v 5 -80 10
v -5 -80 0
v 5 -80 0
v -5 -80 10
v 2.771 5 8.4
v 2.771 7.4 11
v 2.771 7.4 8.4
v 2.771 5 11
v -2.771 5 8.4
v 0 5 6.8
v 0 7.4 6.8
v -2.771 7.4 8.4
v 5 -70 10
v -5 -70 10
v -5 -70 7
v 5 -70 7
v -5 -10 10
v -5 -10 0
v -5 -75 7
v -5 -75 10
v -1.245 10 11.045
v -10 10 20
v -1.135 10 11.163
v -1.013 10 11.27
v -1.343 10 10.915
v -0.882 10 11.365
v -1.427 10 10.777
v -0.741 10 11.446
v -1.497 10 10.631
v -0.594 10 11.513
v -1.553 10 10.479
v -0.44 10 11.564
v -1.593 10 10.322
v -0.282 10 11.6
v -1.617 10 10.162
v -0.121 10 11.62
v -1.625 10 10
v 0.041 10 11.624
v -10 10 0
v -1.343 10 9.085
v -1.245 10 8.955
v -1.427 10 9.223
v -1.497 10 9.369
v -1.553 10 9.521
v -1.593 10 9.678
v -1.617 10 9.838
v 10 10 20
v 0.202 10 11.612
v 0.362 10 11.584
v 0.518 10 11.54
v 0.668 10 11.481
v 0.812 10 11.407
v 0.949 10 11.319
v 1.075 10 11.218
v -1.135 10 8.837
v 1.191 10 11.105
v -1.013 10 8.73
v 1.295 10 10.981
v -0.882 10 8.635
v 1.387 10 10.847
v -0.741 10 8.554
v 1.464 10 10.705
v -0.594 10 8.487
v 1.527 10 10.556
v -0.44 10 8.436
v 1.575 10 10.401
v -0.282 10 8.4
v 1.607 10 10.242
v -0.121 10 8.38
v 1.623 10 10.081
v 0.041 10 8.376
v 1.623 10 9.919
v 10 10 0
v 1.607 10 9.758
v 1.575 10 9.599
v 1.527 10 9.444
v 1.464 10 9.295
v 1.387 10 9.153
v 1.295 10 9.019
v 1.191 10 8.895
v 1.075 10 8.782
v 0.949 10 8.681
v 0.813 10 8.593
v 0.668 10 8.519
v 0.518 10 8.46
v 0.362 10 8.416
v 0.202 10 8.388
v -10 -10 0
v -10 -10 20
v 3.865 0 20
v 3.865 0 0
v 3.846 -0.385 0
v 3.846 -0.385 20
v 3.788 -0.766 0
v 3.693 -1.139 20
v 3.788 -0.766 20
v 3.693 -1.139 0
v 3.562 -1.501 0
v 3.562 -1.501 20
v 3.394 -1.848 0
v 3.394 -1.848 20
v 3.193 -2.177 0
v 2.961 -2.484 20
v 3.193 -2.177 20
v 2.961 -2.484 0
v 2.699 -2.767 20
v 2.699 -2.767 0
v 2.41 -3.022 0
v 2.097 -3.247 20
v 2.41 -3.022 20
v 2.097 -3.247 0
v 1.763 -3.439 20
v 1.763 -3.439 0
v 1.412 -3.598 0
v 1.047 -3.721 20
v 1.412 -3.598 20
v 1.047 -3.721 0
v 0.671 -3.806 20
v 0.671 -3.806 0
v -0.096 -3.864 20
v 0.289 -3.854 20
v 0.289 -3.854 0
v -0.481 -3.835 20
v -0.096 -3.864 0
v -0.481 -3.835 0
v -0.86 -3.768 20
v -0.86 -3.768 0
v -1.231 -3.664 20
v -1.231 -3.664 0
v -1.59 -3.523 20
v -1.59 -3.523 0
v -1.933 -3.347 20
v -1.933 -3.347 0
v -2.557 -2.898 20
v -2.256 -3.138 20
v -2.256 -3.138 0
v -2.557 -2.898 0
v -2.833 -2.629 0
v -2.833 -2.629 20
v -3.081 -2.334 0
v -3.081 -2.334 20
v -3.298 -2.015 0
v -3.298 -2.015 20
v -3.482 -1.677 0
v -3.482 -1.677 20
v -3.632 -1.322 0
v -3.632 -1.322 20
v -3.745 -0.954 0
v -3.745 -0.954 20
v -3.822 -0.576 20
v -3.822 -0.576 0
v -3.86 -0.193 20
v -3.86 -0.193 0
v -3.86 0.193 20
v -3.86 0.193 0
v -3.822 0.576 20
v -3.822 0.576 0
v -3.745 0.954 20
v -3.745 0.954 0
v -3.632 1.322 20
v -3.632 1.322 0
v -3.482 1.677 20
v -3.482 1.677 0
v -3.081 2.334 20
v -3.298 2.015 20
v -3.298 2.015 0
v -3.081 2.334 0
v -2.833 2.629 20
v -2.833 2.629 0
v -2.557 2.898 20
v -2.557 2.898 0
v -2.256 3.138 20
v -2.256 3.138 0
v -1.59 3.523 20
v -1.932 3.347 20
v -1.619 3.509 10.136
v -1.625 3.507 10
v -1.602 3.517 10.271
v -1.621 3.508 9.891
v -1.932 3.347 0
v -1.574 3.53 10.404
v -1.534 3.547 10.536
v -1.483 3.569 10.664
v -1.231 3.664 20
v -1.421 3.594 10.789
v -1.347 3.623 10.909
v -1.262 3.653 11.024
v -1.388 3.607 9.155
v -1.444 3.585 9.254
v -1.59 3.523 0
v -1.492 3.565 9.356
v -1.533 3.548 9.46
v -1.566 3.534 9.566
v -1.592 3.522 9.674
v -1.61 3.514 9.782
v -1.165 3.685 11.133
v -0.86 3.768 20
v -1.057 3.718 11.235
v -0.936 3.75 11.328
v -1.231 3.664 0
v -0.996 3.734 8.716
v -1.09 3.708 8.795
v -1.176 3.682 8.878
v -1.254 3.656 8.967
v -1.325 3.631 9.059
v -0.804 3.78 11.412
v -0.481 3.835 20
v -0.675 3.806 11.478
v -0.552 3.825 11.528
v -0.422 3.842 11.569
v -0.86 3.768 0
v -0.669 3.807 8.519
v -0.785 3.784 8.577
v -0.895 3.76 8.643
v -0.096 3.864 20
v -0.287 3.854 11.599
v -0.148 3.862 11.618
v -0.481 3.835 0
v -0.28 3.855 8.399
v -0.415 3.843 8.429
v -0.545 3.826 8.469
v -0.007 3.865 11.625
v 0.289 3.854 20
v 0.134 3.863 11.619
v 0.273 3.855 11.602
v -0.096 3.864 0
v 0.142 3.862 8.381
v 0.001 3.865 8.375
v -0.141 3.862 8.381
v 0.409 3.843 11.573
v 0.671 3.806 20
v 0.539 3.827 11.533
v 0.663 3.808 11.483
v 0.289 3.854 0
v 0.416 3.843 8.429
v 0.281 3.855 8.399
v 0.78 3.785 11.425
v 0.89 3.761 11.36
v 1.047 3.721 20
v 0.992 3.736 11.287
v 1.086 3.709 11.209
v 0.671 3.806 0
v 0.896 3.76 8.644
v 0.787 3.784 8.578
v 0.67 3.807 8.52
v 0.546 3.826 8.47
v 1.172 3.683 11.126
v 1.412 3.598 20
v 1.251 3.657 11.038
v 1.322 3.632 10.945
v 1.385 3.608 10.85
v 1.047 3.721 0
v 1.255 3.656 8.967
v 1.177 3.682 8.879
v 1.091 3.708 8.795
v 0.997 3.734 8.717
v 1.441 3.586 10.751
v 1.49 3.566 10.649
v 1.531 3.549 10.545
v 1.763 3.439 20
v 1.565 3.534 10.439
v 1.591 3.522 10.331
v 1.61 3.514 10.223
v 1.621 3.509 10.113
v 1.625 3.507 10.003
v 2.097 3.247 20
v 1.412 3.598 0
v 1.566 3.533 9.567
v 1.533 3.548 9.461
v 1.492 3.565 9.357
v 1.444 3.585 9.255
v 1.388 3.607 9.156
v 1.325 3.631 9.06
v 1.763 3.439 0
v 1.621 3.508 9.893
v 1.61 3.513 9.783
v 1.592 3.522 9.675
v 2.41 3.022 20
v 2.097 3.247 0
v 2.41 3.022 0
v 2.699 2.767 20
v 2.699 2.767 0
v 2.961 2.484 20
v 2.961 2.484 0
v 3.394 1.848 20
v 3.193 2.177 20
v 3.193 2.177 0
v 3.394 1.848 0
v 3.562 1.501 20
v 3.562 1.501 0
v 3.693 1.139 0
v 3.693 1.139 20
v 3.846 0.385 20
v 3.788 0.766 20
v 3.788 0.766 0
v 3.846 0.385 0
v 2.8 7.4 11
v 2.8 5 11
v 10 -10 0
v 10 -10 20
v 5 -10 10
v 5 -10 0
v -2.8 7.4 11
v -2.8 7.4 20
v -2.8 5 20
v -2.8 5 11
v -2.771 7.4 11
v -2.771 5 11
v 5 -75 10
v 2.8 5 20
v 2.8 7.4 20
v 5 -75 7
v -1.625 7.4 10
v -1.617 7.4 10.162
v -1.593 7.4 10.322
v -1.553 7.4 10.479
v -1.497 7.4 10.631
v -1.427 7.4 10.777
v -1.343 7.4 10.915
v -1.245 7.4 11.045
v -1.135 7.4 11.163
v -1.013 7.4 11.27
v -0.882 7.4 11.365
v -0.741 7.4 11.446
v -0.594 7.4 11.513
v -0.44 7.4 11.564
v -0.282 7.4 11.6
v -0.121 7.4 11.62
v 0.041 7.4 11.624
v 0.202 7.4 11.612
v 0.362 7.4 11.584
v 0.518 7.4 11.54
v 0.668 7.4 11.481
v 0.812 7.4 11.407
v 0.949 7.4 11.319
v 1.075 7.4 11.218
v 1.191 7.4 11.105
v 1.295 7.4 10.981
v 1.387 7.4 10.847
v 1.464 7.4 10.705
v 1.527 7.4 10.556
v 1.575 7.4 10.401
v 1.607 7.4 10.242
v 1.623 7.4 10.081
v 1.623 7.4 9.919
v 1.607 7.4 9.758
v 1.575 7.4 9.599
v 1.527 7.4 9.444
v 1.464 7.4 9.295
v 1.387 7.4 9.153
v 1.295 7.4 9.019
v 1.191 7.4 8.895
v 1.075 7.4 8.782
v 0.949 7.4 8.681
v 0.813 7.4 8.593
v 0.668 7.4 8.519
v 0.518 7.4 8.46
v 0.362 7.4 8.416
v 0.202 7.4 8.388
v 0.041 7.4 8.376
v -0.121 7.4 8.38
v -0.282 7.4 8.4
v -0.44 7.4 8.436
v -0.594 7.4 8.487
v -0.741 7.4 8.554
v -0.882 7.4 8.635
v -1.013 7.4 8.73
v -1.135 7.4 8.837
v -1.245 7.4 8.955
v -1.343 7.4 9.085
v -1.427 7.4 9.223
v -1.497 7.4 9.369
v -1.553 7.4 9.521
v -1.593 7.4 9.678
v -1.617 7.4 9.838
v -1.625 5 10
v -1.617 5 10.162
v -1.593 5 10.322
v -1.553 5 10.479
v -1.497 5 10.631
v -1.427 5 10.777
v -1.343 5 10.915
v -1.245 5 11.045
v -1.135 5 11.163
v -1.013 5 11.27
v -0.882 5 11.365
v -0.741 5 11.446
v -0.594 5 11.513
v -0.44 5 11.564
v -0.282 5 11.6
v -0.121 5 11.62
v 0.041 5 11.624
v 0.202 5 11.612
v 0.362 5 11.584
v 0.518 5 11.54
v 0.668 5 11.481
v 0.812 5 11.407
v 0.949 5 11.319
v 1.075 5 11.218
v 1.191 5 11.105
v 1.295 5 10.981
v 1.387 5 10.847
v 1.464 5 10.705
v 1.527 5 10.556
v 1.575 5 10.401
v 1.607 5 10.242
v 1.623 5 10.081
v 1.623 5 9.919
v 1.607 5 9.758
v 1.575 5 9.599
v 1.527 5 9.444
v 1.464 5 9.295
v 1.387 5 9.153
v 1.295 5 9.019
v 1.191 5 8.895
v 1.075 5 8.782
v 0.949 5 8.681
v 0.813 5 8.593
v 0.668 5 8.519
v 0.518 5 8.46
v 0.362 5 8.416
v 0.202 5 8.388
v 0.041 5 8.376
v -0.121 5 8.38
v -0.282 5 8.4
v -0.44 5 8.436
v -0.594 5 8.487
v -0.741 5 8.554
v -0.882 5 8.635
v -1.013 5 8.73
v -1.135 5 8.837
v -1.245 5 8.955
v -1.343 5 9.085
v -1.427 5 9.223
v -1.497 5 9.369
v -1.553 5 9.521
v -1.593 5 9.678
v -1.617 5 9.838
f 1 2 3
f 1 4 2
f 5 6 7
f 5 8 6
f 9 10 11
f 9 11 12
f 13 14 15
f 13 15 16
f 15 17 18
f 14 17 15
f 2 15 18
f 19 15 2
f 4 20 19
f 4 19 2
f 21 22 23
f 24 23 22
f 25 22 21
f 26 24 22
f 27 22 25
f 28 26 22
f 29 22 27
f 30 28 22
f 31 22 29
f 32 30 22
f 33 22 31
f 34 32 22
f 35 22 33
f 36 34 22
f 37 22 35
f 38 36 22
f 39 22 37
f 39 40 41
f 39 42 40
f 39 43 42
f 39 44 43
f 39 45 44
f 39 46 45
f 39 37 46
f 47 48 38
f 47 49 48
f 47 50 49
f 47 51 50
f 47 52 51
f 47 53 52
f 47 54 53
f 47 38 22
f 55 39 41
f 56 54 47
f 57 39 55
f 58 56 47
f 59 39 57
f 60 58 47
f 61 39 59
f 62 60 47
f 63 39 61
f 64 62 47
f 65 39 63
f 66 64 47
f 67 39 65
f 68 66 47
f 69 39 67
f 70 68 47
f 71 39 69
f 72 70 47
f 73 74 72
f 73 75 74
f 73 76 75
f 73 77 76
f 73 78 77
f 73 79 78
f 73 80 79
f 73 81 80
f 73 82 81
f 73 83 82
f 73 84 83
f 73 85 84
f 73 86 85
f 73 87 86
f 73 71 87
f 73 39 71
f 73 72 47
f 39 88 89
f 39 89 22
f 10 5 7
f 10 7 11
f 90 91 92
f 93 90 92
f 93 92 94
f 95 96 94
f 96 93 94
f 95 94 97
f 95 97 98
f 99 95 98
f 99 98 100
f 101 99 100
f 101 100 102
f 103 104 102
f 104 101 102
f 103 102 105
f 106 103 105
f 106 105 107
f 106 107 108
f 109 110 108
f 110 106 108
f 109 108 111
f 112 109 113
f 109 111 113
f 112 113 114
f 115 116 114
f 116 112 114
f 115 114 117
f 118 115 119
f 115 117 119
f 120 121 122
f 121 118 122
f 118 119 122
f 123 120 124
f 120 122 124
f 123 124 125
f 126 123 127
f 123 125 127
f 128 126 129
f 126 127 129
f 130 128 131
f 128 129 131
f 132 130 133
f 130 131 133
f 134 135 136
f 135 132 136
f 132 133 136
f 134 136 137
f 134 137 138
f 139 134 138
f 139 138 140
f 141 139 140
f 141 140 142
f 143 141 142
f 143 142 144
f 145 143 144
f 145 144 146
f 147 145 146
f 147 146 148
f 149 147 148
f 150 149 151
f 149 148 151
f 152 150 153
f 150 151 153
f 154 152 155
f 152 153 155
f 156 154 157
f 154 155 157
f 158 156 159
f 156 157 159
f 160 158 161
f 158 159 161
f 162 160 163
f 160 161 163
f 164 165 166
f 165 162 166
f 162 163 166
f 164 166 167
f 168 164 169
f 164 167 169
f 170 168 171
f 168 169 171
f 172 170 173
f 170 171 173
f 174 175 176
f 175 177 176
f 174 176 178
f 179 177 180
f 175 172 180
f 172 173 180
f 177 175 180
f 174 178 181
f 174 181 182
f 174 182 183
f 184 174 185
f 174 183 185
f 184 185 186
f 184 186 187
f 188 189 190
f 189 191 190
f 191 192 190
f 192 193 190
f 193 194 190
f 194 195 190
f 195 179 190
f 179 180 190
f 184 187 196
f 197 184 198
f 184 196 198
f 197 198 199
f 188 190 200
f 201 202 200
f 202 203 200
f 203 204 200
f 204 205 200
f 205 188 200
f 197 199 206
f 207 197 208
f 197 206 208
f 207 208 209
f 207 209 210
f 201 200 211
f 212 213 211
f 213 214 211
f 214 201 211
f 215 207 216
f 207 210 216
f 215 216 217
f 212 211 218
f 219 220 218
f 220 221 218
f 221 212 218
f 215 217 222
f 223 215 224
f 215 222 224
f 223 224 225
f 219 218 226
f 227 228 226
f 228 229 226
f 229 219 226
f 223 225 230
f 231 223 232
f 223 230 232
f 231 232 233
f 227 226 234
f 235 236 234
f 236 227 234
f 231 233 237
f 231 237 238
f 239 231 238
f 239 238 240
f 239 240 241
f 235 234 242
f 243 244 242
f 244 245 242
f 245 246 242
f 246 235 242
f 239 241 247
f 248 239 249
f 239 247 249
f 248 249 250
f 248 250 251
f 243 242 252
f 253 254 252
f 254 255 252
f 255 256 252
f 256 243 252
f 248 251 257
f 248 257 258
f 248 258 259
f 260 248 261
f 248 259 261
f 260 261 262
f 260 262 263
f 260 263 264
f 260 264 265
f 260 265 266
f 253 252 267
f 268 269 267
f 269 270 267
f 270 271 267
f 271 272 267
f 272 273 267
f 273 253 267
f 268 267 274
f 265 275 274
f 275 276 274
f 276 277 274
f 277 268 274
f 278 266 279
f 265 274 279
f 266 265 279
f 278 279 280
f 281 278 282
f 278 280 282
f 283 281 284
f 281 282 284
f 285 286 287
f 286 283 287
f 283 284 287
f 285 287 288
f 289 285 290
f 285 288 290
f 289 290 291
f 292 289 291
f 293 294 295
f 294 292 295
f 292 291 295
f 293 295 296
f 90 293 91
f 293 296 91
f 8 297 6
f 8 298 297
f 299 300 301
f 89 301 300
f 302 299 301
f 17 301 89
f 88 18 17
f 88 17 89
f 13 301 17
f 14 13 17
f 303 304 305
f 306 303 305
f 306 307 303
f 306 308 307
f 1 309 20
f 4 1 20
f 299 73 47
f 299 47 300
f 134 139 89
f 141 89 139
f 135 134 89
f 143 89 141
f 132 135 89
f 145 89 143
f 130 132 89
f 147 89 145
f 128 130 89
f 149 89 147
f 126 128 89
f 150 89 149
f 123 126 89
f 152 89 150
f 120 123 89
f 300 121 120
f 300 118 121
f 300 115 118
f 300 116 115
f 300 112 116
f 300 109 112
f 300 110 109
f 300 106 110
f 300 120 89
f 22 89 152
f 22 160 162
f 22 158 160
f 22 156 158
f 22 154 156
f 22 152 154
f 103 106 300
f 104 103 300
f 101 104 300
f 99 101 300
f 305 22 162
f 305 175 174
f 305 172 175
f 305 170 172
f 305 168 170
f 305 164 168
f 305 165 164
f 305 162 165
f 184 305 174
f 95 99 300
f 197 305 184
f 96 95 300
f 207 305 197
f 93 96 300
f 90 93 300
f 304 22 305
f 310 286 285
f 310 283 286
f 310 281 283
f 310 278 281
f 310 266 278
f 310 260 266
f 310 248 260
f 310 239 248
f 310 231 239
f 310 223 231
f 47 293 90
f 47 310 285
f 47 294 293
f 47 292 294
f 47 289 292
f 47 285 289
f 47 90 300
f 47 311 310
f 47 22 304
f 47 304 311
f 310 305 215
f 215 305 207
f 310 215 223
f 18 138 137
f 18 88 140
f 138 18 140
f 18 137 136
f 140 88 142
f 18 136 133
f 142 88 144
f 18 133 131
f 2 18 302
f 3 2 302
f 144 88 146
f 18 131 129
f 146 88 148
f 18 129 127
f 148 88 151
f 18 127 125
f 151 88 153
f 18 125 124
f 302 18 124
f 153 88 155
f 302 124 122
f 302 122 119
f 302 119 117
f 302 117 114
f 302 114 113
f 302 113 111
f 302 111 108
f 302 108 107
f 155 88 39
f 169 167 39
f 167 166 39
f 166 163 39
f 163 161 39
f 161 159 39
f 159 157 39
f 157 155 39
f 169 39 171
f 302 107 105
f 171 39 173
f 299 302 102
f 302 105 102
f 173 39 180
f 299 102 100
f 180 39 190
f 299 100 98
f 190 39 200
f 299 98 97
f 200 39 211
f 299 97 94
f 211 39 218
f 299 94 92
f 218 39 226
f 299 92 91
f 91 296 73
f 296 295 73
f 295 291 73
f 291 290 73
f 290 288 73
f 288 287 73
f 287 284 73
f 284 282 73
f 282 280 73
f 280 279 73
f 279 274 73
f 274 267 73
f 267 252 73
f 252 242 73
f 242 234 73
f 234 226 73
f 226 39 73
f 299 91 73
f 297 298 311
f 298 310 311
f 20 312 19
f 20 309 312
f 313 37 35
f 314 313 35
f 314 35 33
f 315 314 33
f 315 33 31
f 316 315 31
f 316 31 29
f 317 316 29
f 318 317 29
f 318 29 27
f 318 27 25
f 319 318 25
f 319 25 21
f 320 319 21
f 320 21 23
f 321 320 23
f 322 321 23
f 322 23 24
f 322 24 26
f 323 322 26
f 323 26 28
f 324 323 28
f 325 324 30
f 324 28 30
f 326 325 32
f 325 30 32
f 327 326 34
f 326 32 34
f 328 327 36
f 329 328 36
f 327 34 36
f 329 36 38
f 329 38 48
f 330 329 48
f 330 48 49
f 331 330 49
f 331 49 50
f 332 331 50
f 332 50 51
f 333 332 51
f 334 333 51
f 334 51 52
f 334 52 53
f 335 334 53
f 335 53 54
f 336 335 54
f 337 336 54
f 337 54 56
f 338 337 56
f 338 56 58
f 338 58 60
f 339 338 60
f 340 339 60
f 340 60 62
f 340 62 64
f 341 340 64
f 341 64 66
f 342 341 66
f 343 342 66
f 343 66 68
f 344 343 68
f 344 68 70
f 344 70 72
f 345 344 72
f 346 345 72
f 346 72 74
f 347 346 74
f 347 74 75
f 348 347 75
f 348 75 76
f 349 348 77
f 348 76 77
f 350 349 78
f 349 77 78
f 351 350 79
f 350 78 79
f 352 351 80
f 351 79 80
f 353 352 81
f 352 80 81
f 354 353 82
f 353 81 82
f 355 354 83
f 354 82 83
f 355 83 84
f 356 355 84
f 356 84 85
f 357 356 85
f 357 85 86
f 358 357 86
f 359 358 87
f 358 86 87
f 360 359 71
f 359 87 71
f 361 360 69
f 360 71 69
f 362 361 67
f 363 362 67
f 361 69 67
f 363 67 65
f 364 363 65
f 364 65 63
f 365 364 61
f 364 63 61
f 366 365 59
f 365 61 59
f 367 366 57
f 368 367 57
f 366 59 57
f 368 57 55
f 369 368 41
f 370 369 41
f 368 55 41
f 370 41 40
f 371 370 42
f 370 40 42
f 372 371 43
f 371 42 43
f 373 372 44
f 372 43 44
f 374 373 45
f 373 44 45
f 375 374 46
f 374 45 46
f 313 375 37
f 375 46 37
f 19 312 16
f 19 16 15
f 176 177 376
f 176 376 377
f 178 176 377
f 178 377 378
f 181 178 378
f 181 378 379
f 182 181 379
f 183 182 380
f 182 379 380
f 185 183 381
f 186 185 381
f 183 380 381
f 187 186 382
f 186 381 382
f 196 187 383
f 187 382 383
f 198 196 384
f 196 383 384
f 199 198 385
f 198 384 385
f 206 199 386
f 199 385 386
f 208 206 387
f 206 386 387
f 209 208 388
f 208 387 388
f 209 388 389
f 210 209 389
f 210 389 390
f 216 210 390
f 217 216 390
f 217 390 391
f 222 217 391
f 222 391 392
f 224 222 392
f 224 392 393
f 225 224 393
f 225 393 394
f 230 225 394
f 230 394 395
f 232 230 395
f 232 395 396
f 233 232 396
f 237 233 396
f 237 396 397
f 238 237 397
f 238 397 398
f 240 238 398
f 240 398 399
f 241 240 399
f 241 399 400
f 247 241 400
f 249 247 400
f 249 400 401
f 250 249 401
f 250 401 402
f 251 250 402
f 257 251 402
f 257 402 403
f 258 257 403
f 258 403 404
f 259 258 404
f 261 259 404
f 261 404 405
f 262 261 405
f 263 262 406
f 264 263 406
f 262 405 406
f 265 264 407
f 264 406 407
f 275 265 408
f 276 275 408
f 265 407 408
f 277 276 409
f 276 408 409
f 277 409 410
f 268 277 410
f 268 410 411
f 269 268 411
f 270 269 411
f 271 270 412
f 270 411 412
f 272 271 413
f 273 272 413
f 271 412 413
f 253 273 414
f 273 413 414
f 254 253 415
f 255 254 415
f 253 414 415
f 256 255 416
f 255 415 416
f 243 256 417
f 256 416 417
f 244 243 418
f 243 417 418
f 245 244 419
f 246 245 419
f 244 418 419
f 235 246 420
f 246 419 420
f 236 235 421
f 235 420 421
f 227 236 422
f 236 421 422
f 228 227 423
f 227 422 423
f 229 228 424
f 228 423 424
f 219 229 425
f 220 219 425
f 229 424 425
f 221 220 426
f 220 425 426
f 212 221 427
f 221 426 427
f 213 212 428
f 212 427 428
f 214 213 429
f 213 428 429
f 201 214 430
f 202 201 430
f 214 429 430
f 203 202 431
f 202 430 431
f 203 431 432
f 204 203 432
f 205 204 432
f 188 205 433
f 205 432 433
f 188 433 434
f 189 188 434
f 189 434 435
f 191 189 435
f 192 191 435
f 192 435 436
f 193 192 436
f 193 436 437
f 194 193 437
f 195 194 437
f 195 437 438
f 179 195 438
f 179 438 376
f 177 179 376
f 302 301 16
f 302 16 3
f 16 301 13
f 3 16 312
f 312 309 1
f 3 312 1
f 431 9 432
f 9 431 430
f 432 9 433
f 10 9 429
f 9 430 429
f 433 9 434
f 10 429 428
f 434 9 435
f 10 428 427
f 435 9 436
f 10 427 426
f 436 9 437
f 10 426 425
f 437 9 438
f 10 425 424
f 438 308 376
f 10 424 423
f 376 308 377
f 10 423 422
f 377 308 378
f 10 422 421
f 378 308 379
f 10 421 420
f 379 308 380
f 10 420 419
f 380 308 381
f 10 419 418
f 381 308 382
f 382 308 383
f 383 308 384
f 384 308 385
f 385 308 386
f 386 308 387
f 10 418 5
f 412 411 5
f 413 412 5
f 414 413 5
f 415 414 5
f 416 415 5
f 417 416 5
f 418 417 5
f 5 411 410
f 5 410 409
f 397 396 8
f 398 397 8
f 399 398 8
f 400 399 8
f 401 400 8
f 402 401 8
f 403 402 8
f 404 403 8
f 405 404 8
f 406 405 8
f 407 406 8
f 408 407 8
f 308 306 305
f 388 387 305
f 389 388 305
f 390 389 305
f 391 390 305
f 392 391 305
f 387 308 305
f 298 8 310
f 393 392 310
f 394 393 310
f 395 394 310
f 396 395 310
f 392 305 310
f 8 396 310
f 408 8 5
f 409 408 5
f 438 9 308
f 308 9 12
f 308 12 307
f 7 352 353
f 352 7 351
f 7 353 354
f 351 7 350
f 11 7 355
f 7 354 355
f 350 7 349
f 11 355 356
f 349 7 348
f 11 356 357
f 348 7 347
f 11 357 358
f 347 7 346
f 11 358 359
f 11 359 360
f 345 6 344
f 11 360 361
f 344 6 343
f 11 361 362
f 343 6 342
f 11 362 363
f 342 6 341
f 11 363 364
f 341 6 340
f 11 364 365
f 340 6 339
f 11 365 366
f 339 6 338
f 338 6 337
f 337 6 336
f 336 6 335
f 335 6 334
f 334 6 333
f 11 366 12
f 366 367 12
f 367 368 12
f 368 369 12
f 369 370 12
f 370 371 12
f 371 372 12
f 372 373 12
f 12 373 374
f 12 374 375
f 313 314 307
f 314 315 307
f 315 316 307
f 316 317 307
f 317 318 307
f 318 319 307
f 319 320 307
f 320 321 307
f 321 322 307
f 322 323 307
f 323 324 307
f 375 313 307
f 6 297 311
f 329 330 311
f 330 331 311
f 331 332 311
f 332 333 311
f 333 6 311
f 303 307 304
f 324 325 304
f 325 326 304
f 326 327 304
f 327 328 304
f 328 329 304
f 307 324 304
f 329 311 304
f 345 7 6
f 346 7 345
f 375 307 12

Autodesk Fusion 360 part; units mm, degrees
sketch "Esquisse1" plane through (0, 0, 0) normal (0, 0, 1) x (1, 0, 0)
sketch "Esquisse2" plane through (0, 0, 0) normal (0, 0, 1) x (1, 0, 0)
  circle A0 centre (0, 0) radius 3.865
  line L0 (10, -10) -> (-10, -10)
  line L1 (-10, -10) -> (-10, 10)
  line L2 (-10, 10) -> (10, 10)
  line L3 (10, 10) -> (10, -10)
  dimension "d2" = 7.73
extrude "Extrusion1" add sketch "Esquisse2" along normal blind 20
sketch "Esquisse3" plane through (0, 10, 0) normal (0, 1, 0) x (-1, 0, 0)
  line L0 (-10, 0) -> (10, 0)
  line L1 (10, 0) -> (10, 20)
  line L2 (10, 20) -> (-10, 20)
  line L3 (-10, 20) -> (-10, 0)
sketch "Esquisse4" plane through (0, 0, 20) normal (0, 0, 1) x (-1, 0, 0)
  circle A0 centre (0, 0) radius 3.865
  line L0 (-10, -10) -> (10, -10)
  line L1 (10, -10) -> (10, 10)
  line L2 (10, 10) -> (-10, 10)
  line L3 (-10, 10) -> (-10, -10)
  line L4 (0, -7.4) -> (2.8, -7.4)
  line L5 (2.8, -7.4) -> (2.8, -5)
  line L6 (2.8, -5) -> (-2.8, -5)
  line L7 (-2.8, -5) -> (-2.8, -7.4)
  line L8 (-2.8, -7.4) -> (0, -7.4)
  dimension "d12" = 2.8
  dimension "d13" = 5.6
ref_plane "Plan de construction1" through (0, 0, 20) normal (0, 1, 0) x (-1, 0, 0)
sketch "Esquisse5" plane through (0, 0, 20) normal (0, 1, 0) x (-1, 0, 0)
  line L0 (0, 0) -> (0, -20)
  line L1 (-10, -10) -> (10, -10)
  line L2 (0, -6.8) -> (-2.7713, -8.4)
  line L3 (-2.7713, -8.4) -> (-2.7713, -11.6)
  line L4 (-2.7713, -11.6) -> (0, -13.2)
  line L5 (0, -13.2) -> (2.7713, -11.6)
  line L6 (2.7713, -11.6) -> (2.7713, -8.4)
  line L7 (2.7713, -8.4) -> (0, -6.8)
  point P0 (0, -10)
  dimension "d6" = 3.2
extrude "Extrusion2" cut sketch "Esquisse5" along normal blind 2.4 from surface at 5
extrude "Extrusion3" cut sketch "Esquisse4" against normal blind 9 contours L4 L5 L6 L7 L8
sketch "Esquisse6" plane through (0, 10, 0) normal (0, 1, 0) x (-1, 0, 0)
  circle A0 centre (0, 10) radius 1.625
  dimension "d16" = 3.25
extrude "Extrusion4" cut sketch "Esquisse6" against normal blind 10
sketch "Esquisse7" plane through (0, -10, 0) normal (0, -1, 0) x (1, 0, 0)
  line L0 (-10, 0) -> (10, 0)
  line L1 (10, 0) -> (10, 20)
  line L2 (10, 20) -> (-10, 20)
  line L3 (-10, 20) -> (-10, 0)
  line L4 (5, 15) -> (-5, 15)
  line L5 (-5, 15) -> (-5, 5)
  line L6 (-5, 5) -> (5, 5)
  line L7 (5, 5) -> (5, 15)
  line L8 (5, 15) -> (-5, 5) construction
  line L9 (-5, 15) -> (5, 5) construction
  point P0 (0, 10)
  dimension "d19" = 10
  dimension "d20" = 10
extrude "Extrusion5" add sketch "Esquisse7" along normal blind 70 contours L4 L5 L6 L7
sketch "Esquisse8" plane through (0, 0, 15) normal (0, 0, 1) x (-1, 0, 0)
  line L0 (-5, 10) -> (5, 10)
  line L1 (5, 10) -> (5, 80)
  line L2 (5, 80) -> (-5, 80)
  line L3 (-5, 80) -> (-5, 10)
  line L4 (5, 80) -> (-5, 80)
  line L5 (-5, 80) -> (-5, 75)
  line L6 (-5, 75) -> (5, 75)
  line L7 (5, 75) -> (5, 80)
  line L8 (-5, 75) -> (5, 75)
  line L9 (5, 75) -> (5, 70)
  line L10 (5, 70) -> (-5, 70)
  line L11 (-5, 70) -> (-5, 75)
extrude "Extrusion6" cut sketch "Esquisse8" against normal blind 3 contours L1 L3 L6 L8 L9 L10 L11
extrude "Extrusion7" add 1 faces at (-1.6667, -33.3333, 5) along direction (0, 0, -1) blind 5
extrude "Extrusion8" cut 2 faces at (1.6667, -50, 15) (1.6667, -76.6667, 15) along direction (0, 0, -1) blind 5
extrude "Extrusion9" cut 1 faces at (-1.6667, -71.6667, 12) along direction (0, 0, -1) blind 5
